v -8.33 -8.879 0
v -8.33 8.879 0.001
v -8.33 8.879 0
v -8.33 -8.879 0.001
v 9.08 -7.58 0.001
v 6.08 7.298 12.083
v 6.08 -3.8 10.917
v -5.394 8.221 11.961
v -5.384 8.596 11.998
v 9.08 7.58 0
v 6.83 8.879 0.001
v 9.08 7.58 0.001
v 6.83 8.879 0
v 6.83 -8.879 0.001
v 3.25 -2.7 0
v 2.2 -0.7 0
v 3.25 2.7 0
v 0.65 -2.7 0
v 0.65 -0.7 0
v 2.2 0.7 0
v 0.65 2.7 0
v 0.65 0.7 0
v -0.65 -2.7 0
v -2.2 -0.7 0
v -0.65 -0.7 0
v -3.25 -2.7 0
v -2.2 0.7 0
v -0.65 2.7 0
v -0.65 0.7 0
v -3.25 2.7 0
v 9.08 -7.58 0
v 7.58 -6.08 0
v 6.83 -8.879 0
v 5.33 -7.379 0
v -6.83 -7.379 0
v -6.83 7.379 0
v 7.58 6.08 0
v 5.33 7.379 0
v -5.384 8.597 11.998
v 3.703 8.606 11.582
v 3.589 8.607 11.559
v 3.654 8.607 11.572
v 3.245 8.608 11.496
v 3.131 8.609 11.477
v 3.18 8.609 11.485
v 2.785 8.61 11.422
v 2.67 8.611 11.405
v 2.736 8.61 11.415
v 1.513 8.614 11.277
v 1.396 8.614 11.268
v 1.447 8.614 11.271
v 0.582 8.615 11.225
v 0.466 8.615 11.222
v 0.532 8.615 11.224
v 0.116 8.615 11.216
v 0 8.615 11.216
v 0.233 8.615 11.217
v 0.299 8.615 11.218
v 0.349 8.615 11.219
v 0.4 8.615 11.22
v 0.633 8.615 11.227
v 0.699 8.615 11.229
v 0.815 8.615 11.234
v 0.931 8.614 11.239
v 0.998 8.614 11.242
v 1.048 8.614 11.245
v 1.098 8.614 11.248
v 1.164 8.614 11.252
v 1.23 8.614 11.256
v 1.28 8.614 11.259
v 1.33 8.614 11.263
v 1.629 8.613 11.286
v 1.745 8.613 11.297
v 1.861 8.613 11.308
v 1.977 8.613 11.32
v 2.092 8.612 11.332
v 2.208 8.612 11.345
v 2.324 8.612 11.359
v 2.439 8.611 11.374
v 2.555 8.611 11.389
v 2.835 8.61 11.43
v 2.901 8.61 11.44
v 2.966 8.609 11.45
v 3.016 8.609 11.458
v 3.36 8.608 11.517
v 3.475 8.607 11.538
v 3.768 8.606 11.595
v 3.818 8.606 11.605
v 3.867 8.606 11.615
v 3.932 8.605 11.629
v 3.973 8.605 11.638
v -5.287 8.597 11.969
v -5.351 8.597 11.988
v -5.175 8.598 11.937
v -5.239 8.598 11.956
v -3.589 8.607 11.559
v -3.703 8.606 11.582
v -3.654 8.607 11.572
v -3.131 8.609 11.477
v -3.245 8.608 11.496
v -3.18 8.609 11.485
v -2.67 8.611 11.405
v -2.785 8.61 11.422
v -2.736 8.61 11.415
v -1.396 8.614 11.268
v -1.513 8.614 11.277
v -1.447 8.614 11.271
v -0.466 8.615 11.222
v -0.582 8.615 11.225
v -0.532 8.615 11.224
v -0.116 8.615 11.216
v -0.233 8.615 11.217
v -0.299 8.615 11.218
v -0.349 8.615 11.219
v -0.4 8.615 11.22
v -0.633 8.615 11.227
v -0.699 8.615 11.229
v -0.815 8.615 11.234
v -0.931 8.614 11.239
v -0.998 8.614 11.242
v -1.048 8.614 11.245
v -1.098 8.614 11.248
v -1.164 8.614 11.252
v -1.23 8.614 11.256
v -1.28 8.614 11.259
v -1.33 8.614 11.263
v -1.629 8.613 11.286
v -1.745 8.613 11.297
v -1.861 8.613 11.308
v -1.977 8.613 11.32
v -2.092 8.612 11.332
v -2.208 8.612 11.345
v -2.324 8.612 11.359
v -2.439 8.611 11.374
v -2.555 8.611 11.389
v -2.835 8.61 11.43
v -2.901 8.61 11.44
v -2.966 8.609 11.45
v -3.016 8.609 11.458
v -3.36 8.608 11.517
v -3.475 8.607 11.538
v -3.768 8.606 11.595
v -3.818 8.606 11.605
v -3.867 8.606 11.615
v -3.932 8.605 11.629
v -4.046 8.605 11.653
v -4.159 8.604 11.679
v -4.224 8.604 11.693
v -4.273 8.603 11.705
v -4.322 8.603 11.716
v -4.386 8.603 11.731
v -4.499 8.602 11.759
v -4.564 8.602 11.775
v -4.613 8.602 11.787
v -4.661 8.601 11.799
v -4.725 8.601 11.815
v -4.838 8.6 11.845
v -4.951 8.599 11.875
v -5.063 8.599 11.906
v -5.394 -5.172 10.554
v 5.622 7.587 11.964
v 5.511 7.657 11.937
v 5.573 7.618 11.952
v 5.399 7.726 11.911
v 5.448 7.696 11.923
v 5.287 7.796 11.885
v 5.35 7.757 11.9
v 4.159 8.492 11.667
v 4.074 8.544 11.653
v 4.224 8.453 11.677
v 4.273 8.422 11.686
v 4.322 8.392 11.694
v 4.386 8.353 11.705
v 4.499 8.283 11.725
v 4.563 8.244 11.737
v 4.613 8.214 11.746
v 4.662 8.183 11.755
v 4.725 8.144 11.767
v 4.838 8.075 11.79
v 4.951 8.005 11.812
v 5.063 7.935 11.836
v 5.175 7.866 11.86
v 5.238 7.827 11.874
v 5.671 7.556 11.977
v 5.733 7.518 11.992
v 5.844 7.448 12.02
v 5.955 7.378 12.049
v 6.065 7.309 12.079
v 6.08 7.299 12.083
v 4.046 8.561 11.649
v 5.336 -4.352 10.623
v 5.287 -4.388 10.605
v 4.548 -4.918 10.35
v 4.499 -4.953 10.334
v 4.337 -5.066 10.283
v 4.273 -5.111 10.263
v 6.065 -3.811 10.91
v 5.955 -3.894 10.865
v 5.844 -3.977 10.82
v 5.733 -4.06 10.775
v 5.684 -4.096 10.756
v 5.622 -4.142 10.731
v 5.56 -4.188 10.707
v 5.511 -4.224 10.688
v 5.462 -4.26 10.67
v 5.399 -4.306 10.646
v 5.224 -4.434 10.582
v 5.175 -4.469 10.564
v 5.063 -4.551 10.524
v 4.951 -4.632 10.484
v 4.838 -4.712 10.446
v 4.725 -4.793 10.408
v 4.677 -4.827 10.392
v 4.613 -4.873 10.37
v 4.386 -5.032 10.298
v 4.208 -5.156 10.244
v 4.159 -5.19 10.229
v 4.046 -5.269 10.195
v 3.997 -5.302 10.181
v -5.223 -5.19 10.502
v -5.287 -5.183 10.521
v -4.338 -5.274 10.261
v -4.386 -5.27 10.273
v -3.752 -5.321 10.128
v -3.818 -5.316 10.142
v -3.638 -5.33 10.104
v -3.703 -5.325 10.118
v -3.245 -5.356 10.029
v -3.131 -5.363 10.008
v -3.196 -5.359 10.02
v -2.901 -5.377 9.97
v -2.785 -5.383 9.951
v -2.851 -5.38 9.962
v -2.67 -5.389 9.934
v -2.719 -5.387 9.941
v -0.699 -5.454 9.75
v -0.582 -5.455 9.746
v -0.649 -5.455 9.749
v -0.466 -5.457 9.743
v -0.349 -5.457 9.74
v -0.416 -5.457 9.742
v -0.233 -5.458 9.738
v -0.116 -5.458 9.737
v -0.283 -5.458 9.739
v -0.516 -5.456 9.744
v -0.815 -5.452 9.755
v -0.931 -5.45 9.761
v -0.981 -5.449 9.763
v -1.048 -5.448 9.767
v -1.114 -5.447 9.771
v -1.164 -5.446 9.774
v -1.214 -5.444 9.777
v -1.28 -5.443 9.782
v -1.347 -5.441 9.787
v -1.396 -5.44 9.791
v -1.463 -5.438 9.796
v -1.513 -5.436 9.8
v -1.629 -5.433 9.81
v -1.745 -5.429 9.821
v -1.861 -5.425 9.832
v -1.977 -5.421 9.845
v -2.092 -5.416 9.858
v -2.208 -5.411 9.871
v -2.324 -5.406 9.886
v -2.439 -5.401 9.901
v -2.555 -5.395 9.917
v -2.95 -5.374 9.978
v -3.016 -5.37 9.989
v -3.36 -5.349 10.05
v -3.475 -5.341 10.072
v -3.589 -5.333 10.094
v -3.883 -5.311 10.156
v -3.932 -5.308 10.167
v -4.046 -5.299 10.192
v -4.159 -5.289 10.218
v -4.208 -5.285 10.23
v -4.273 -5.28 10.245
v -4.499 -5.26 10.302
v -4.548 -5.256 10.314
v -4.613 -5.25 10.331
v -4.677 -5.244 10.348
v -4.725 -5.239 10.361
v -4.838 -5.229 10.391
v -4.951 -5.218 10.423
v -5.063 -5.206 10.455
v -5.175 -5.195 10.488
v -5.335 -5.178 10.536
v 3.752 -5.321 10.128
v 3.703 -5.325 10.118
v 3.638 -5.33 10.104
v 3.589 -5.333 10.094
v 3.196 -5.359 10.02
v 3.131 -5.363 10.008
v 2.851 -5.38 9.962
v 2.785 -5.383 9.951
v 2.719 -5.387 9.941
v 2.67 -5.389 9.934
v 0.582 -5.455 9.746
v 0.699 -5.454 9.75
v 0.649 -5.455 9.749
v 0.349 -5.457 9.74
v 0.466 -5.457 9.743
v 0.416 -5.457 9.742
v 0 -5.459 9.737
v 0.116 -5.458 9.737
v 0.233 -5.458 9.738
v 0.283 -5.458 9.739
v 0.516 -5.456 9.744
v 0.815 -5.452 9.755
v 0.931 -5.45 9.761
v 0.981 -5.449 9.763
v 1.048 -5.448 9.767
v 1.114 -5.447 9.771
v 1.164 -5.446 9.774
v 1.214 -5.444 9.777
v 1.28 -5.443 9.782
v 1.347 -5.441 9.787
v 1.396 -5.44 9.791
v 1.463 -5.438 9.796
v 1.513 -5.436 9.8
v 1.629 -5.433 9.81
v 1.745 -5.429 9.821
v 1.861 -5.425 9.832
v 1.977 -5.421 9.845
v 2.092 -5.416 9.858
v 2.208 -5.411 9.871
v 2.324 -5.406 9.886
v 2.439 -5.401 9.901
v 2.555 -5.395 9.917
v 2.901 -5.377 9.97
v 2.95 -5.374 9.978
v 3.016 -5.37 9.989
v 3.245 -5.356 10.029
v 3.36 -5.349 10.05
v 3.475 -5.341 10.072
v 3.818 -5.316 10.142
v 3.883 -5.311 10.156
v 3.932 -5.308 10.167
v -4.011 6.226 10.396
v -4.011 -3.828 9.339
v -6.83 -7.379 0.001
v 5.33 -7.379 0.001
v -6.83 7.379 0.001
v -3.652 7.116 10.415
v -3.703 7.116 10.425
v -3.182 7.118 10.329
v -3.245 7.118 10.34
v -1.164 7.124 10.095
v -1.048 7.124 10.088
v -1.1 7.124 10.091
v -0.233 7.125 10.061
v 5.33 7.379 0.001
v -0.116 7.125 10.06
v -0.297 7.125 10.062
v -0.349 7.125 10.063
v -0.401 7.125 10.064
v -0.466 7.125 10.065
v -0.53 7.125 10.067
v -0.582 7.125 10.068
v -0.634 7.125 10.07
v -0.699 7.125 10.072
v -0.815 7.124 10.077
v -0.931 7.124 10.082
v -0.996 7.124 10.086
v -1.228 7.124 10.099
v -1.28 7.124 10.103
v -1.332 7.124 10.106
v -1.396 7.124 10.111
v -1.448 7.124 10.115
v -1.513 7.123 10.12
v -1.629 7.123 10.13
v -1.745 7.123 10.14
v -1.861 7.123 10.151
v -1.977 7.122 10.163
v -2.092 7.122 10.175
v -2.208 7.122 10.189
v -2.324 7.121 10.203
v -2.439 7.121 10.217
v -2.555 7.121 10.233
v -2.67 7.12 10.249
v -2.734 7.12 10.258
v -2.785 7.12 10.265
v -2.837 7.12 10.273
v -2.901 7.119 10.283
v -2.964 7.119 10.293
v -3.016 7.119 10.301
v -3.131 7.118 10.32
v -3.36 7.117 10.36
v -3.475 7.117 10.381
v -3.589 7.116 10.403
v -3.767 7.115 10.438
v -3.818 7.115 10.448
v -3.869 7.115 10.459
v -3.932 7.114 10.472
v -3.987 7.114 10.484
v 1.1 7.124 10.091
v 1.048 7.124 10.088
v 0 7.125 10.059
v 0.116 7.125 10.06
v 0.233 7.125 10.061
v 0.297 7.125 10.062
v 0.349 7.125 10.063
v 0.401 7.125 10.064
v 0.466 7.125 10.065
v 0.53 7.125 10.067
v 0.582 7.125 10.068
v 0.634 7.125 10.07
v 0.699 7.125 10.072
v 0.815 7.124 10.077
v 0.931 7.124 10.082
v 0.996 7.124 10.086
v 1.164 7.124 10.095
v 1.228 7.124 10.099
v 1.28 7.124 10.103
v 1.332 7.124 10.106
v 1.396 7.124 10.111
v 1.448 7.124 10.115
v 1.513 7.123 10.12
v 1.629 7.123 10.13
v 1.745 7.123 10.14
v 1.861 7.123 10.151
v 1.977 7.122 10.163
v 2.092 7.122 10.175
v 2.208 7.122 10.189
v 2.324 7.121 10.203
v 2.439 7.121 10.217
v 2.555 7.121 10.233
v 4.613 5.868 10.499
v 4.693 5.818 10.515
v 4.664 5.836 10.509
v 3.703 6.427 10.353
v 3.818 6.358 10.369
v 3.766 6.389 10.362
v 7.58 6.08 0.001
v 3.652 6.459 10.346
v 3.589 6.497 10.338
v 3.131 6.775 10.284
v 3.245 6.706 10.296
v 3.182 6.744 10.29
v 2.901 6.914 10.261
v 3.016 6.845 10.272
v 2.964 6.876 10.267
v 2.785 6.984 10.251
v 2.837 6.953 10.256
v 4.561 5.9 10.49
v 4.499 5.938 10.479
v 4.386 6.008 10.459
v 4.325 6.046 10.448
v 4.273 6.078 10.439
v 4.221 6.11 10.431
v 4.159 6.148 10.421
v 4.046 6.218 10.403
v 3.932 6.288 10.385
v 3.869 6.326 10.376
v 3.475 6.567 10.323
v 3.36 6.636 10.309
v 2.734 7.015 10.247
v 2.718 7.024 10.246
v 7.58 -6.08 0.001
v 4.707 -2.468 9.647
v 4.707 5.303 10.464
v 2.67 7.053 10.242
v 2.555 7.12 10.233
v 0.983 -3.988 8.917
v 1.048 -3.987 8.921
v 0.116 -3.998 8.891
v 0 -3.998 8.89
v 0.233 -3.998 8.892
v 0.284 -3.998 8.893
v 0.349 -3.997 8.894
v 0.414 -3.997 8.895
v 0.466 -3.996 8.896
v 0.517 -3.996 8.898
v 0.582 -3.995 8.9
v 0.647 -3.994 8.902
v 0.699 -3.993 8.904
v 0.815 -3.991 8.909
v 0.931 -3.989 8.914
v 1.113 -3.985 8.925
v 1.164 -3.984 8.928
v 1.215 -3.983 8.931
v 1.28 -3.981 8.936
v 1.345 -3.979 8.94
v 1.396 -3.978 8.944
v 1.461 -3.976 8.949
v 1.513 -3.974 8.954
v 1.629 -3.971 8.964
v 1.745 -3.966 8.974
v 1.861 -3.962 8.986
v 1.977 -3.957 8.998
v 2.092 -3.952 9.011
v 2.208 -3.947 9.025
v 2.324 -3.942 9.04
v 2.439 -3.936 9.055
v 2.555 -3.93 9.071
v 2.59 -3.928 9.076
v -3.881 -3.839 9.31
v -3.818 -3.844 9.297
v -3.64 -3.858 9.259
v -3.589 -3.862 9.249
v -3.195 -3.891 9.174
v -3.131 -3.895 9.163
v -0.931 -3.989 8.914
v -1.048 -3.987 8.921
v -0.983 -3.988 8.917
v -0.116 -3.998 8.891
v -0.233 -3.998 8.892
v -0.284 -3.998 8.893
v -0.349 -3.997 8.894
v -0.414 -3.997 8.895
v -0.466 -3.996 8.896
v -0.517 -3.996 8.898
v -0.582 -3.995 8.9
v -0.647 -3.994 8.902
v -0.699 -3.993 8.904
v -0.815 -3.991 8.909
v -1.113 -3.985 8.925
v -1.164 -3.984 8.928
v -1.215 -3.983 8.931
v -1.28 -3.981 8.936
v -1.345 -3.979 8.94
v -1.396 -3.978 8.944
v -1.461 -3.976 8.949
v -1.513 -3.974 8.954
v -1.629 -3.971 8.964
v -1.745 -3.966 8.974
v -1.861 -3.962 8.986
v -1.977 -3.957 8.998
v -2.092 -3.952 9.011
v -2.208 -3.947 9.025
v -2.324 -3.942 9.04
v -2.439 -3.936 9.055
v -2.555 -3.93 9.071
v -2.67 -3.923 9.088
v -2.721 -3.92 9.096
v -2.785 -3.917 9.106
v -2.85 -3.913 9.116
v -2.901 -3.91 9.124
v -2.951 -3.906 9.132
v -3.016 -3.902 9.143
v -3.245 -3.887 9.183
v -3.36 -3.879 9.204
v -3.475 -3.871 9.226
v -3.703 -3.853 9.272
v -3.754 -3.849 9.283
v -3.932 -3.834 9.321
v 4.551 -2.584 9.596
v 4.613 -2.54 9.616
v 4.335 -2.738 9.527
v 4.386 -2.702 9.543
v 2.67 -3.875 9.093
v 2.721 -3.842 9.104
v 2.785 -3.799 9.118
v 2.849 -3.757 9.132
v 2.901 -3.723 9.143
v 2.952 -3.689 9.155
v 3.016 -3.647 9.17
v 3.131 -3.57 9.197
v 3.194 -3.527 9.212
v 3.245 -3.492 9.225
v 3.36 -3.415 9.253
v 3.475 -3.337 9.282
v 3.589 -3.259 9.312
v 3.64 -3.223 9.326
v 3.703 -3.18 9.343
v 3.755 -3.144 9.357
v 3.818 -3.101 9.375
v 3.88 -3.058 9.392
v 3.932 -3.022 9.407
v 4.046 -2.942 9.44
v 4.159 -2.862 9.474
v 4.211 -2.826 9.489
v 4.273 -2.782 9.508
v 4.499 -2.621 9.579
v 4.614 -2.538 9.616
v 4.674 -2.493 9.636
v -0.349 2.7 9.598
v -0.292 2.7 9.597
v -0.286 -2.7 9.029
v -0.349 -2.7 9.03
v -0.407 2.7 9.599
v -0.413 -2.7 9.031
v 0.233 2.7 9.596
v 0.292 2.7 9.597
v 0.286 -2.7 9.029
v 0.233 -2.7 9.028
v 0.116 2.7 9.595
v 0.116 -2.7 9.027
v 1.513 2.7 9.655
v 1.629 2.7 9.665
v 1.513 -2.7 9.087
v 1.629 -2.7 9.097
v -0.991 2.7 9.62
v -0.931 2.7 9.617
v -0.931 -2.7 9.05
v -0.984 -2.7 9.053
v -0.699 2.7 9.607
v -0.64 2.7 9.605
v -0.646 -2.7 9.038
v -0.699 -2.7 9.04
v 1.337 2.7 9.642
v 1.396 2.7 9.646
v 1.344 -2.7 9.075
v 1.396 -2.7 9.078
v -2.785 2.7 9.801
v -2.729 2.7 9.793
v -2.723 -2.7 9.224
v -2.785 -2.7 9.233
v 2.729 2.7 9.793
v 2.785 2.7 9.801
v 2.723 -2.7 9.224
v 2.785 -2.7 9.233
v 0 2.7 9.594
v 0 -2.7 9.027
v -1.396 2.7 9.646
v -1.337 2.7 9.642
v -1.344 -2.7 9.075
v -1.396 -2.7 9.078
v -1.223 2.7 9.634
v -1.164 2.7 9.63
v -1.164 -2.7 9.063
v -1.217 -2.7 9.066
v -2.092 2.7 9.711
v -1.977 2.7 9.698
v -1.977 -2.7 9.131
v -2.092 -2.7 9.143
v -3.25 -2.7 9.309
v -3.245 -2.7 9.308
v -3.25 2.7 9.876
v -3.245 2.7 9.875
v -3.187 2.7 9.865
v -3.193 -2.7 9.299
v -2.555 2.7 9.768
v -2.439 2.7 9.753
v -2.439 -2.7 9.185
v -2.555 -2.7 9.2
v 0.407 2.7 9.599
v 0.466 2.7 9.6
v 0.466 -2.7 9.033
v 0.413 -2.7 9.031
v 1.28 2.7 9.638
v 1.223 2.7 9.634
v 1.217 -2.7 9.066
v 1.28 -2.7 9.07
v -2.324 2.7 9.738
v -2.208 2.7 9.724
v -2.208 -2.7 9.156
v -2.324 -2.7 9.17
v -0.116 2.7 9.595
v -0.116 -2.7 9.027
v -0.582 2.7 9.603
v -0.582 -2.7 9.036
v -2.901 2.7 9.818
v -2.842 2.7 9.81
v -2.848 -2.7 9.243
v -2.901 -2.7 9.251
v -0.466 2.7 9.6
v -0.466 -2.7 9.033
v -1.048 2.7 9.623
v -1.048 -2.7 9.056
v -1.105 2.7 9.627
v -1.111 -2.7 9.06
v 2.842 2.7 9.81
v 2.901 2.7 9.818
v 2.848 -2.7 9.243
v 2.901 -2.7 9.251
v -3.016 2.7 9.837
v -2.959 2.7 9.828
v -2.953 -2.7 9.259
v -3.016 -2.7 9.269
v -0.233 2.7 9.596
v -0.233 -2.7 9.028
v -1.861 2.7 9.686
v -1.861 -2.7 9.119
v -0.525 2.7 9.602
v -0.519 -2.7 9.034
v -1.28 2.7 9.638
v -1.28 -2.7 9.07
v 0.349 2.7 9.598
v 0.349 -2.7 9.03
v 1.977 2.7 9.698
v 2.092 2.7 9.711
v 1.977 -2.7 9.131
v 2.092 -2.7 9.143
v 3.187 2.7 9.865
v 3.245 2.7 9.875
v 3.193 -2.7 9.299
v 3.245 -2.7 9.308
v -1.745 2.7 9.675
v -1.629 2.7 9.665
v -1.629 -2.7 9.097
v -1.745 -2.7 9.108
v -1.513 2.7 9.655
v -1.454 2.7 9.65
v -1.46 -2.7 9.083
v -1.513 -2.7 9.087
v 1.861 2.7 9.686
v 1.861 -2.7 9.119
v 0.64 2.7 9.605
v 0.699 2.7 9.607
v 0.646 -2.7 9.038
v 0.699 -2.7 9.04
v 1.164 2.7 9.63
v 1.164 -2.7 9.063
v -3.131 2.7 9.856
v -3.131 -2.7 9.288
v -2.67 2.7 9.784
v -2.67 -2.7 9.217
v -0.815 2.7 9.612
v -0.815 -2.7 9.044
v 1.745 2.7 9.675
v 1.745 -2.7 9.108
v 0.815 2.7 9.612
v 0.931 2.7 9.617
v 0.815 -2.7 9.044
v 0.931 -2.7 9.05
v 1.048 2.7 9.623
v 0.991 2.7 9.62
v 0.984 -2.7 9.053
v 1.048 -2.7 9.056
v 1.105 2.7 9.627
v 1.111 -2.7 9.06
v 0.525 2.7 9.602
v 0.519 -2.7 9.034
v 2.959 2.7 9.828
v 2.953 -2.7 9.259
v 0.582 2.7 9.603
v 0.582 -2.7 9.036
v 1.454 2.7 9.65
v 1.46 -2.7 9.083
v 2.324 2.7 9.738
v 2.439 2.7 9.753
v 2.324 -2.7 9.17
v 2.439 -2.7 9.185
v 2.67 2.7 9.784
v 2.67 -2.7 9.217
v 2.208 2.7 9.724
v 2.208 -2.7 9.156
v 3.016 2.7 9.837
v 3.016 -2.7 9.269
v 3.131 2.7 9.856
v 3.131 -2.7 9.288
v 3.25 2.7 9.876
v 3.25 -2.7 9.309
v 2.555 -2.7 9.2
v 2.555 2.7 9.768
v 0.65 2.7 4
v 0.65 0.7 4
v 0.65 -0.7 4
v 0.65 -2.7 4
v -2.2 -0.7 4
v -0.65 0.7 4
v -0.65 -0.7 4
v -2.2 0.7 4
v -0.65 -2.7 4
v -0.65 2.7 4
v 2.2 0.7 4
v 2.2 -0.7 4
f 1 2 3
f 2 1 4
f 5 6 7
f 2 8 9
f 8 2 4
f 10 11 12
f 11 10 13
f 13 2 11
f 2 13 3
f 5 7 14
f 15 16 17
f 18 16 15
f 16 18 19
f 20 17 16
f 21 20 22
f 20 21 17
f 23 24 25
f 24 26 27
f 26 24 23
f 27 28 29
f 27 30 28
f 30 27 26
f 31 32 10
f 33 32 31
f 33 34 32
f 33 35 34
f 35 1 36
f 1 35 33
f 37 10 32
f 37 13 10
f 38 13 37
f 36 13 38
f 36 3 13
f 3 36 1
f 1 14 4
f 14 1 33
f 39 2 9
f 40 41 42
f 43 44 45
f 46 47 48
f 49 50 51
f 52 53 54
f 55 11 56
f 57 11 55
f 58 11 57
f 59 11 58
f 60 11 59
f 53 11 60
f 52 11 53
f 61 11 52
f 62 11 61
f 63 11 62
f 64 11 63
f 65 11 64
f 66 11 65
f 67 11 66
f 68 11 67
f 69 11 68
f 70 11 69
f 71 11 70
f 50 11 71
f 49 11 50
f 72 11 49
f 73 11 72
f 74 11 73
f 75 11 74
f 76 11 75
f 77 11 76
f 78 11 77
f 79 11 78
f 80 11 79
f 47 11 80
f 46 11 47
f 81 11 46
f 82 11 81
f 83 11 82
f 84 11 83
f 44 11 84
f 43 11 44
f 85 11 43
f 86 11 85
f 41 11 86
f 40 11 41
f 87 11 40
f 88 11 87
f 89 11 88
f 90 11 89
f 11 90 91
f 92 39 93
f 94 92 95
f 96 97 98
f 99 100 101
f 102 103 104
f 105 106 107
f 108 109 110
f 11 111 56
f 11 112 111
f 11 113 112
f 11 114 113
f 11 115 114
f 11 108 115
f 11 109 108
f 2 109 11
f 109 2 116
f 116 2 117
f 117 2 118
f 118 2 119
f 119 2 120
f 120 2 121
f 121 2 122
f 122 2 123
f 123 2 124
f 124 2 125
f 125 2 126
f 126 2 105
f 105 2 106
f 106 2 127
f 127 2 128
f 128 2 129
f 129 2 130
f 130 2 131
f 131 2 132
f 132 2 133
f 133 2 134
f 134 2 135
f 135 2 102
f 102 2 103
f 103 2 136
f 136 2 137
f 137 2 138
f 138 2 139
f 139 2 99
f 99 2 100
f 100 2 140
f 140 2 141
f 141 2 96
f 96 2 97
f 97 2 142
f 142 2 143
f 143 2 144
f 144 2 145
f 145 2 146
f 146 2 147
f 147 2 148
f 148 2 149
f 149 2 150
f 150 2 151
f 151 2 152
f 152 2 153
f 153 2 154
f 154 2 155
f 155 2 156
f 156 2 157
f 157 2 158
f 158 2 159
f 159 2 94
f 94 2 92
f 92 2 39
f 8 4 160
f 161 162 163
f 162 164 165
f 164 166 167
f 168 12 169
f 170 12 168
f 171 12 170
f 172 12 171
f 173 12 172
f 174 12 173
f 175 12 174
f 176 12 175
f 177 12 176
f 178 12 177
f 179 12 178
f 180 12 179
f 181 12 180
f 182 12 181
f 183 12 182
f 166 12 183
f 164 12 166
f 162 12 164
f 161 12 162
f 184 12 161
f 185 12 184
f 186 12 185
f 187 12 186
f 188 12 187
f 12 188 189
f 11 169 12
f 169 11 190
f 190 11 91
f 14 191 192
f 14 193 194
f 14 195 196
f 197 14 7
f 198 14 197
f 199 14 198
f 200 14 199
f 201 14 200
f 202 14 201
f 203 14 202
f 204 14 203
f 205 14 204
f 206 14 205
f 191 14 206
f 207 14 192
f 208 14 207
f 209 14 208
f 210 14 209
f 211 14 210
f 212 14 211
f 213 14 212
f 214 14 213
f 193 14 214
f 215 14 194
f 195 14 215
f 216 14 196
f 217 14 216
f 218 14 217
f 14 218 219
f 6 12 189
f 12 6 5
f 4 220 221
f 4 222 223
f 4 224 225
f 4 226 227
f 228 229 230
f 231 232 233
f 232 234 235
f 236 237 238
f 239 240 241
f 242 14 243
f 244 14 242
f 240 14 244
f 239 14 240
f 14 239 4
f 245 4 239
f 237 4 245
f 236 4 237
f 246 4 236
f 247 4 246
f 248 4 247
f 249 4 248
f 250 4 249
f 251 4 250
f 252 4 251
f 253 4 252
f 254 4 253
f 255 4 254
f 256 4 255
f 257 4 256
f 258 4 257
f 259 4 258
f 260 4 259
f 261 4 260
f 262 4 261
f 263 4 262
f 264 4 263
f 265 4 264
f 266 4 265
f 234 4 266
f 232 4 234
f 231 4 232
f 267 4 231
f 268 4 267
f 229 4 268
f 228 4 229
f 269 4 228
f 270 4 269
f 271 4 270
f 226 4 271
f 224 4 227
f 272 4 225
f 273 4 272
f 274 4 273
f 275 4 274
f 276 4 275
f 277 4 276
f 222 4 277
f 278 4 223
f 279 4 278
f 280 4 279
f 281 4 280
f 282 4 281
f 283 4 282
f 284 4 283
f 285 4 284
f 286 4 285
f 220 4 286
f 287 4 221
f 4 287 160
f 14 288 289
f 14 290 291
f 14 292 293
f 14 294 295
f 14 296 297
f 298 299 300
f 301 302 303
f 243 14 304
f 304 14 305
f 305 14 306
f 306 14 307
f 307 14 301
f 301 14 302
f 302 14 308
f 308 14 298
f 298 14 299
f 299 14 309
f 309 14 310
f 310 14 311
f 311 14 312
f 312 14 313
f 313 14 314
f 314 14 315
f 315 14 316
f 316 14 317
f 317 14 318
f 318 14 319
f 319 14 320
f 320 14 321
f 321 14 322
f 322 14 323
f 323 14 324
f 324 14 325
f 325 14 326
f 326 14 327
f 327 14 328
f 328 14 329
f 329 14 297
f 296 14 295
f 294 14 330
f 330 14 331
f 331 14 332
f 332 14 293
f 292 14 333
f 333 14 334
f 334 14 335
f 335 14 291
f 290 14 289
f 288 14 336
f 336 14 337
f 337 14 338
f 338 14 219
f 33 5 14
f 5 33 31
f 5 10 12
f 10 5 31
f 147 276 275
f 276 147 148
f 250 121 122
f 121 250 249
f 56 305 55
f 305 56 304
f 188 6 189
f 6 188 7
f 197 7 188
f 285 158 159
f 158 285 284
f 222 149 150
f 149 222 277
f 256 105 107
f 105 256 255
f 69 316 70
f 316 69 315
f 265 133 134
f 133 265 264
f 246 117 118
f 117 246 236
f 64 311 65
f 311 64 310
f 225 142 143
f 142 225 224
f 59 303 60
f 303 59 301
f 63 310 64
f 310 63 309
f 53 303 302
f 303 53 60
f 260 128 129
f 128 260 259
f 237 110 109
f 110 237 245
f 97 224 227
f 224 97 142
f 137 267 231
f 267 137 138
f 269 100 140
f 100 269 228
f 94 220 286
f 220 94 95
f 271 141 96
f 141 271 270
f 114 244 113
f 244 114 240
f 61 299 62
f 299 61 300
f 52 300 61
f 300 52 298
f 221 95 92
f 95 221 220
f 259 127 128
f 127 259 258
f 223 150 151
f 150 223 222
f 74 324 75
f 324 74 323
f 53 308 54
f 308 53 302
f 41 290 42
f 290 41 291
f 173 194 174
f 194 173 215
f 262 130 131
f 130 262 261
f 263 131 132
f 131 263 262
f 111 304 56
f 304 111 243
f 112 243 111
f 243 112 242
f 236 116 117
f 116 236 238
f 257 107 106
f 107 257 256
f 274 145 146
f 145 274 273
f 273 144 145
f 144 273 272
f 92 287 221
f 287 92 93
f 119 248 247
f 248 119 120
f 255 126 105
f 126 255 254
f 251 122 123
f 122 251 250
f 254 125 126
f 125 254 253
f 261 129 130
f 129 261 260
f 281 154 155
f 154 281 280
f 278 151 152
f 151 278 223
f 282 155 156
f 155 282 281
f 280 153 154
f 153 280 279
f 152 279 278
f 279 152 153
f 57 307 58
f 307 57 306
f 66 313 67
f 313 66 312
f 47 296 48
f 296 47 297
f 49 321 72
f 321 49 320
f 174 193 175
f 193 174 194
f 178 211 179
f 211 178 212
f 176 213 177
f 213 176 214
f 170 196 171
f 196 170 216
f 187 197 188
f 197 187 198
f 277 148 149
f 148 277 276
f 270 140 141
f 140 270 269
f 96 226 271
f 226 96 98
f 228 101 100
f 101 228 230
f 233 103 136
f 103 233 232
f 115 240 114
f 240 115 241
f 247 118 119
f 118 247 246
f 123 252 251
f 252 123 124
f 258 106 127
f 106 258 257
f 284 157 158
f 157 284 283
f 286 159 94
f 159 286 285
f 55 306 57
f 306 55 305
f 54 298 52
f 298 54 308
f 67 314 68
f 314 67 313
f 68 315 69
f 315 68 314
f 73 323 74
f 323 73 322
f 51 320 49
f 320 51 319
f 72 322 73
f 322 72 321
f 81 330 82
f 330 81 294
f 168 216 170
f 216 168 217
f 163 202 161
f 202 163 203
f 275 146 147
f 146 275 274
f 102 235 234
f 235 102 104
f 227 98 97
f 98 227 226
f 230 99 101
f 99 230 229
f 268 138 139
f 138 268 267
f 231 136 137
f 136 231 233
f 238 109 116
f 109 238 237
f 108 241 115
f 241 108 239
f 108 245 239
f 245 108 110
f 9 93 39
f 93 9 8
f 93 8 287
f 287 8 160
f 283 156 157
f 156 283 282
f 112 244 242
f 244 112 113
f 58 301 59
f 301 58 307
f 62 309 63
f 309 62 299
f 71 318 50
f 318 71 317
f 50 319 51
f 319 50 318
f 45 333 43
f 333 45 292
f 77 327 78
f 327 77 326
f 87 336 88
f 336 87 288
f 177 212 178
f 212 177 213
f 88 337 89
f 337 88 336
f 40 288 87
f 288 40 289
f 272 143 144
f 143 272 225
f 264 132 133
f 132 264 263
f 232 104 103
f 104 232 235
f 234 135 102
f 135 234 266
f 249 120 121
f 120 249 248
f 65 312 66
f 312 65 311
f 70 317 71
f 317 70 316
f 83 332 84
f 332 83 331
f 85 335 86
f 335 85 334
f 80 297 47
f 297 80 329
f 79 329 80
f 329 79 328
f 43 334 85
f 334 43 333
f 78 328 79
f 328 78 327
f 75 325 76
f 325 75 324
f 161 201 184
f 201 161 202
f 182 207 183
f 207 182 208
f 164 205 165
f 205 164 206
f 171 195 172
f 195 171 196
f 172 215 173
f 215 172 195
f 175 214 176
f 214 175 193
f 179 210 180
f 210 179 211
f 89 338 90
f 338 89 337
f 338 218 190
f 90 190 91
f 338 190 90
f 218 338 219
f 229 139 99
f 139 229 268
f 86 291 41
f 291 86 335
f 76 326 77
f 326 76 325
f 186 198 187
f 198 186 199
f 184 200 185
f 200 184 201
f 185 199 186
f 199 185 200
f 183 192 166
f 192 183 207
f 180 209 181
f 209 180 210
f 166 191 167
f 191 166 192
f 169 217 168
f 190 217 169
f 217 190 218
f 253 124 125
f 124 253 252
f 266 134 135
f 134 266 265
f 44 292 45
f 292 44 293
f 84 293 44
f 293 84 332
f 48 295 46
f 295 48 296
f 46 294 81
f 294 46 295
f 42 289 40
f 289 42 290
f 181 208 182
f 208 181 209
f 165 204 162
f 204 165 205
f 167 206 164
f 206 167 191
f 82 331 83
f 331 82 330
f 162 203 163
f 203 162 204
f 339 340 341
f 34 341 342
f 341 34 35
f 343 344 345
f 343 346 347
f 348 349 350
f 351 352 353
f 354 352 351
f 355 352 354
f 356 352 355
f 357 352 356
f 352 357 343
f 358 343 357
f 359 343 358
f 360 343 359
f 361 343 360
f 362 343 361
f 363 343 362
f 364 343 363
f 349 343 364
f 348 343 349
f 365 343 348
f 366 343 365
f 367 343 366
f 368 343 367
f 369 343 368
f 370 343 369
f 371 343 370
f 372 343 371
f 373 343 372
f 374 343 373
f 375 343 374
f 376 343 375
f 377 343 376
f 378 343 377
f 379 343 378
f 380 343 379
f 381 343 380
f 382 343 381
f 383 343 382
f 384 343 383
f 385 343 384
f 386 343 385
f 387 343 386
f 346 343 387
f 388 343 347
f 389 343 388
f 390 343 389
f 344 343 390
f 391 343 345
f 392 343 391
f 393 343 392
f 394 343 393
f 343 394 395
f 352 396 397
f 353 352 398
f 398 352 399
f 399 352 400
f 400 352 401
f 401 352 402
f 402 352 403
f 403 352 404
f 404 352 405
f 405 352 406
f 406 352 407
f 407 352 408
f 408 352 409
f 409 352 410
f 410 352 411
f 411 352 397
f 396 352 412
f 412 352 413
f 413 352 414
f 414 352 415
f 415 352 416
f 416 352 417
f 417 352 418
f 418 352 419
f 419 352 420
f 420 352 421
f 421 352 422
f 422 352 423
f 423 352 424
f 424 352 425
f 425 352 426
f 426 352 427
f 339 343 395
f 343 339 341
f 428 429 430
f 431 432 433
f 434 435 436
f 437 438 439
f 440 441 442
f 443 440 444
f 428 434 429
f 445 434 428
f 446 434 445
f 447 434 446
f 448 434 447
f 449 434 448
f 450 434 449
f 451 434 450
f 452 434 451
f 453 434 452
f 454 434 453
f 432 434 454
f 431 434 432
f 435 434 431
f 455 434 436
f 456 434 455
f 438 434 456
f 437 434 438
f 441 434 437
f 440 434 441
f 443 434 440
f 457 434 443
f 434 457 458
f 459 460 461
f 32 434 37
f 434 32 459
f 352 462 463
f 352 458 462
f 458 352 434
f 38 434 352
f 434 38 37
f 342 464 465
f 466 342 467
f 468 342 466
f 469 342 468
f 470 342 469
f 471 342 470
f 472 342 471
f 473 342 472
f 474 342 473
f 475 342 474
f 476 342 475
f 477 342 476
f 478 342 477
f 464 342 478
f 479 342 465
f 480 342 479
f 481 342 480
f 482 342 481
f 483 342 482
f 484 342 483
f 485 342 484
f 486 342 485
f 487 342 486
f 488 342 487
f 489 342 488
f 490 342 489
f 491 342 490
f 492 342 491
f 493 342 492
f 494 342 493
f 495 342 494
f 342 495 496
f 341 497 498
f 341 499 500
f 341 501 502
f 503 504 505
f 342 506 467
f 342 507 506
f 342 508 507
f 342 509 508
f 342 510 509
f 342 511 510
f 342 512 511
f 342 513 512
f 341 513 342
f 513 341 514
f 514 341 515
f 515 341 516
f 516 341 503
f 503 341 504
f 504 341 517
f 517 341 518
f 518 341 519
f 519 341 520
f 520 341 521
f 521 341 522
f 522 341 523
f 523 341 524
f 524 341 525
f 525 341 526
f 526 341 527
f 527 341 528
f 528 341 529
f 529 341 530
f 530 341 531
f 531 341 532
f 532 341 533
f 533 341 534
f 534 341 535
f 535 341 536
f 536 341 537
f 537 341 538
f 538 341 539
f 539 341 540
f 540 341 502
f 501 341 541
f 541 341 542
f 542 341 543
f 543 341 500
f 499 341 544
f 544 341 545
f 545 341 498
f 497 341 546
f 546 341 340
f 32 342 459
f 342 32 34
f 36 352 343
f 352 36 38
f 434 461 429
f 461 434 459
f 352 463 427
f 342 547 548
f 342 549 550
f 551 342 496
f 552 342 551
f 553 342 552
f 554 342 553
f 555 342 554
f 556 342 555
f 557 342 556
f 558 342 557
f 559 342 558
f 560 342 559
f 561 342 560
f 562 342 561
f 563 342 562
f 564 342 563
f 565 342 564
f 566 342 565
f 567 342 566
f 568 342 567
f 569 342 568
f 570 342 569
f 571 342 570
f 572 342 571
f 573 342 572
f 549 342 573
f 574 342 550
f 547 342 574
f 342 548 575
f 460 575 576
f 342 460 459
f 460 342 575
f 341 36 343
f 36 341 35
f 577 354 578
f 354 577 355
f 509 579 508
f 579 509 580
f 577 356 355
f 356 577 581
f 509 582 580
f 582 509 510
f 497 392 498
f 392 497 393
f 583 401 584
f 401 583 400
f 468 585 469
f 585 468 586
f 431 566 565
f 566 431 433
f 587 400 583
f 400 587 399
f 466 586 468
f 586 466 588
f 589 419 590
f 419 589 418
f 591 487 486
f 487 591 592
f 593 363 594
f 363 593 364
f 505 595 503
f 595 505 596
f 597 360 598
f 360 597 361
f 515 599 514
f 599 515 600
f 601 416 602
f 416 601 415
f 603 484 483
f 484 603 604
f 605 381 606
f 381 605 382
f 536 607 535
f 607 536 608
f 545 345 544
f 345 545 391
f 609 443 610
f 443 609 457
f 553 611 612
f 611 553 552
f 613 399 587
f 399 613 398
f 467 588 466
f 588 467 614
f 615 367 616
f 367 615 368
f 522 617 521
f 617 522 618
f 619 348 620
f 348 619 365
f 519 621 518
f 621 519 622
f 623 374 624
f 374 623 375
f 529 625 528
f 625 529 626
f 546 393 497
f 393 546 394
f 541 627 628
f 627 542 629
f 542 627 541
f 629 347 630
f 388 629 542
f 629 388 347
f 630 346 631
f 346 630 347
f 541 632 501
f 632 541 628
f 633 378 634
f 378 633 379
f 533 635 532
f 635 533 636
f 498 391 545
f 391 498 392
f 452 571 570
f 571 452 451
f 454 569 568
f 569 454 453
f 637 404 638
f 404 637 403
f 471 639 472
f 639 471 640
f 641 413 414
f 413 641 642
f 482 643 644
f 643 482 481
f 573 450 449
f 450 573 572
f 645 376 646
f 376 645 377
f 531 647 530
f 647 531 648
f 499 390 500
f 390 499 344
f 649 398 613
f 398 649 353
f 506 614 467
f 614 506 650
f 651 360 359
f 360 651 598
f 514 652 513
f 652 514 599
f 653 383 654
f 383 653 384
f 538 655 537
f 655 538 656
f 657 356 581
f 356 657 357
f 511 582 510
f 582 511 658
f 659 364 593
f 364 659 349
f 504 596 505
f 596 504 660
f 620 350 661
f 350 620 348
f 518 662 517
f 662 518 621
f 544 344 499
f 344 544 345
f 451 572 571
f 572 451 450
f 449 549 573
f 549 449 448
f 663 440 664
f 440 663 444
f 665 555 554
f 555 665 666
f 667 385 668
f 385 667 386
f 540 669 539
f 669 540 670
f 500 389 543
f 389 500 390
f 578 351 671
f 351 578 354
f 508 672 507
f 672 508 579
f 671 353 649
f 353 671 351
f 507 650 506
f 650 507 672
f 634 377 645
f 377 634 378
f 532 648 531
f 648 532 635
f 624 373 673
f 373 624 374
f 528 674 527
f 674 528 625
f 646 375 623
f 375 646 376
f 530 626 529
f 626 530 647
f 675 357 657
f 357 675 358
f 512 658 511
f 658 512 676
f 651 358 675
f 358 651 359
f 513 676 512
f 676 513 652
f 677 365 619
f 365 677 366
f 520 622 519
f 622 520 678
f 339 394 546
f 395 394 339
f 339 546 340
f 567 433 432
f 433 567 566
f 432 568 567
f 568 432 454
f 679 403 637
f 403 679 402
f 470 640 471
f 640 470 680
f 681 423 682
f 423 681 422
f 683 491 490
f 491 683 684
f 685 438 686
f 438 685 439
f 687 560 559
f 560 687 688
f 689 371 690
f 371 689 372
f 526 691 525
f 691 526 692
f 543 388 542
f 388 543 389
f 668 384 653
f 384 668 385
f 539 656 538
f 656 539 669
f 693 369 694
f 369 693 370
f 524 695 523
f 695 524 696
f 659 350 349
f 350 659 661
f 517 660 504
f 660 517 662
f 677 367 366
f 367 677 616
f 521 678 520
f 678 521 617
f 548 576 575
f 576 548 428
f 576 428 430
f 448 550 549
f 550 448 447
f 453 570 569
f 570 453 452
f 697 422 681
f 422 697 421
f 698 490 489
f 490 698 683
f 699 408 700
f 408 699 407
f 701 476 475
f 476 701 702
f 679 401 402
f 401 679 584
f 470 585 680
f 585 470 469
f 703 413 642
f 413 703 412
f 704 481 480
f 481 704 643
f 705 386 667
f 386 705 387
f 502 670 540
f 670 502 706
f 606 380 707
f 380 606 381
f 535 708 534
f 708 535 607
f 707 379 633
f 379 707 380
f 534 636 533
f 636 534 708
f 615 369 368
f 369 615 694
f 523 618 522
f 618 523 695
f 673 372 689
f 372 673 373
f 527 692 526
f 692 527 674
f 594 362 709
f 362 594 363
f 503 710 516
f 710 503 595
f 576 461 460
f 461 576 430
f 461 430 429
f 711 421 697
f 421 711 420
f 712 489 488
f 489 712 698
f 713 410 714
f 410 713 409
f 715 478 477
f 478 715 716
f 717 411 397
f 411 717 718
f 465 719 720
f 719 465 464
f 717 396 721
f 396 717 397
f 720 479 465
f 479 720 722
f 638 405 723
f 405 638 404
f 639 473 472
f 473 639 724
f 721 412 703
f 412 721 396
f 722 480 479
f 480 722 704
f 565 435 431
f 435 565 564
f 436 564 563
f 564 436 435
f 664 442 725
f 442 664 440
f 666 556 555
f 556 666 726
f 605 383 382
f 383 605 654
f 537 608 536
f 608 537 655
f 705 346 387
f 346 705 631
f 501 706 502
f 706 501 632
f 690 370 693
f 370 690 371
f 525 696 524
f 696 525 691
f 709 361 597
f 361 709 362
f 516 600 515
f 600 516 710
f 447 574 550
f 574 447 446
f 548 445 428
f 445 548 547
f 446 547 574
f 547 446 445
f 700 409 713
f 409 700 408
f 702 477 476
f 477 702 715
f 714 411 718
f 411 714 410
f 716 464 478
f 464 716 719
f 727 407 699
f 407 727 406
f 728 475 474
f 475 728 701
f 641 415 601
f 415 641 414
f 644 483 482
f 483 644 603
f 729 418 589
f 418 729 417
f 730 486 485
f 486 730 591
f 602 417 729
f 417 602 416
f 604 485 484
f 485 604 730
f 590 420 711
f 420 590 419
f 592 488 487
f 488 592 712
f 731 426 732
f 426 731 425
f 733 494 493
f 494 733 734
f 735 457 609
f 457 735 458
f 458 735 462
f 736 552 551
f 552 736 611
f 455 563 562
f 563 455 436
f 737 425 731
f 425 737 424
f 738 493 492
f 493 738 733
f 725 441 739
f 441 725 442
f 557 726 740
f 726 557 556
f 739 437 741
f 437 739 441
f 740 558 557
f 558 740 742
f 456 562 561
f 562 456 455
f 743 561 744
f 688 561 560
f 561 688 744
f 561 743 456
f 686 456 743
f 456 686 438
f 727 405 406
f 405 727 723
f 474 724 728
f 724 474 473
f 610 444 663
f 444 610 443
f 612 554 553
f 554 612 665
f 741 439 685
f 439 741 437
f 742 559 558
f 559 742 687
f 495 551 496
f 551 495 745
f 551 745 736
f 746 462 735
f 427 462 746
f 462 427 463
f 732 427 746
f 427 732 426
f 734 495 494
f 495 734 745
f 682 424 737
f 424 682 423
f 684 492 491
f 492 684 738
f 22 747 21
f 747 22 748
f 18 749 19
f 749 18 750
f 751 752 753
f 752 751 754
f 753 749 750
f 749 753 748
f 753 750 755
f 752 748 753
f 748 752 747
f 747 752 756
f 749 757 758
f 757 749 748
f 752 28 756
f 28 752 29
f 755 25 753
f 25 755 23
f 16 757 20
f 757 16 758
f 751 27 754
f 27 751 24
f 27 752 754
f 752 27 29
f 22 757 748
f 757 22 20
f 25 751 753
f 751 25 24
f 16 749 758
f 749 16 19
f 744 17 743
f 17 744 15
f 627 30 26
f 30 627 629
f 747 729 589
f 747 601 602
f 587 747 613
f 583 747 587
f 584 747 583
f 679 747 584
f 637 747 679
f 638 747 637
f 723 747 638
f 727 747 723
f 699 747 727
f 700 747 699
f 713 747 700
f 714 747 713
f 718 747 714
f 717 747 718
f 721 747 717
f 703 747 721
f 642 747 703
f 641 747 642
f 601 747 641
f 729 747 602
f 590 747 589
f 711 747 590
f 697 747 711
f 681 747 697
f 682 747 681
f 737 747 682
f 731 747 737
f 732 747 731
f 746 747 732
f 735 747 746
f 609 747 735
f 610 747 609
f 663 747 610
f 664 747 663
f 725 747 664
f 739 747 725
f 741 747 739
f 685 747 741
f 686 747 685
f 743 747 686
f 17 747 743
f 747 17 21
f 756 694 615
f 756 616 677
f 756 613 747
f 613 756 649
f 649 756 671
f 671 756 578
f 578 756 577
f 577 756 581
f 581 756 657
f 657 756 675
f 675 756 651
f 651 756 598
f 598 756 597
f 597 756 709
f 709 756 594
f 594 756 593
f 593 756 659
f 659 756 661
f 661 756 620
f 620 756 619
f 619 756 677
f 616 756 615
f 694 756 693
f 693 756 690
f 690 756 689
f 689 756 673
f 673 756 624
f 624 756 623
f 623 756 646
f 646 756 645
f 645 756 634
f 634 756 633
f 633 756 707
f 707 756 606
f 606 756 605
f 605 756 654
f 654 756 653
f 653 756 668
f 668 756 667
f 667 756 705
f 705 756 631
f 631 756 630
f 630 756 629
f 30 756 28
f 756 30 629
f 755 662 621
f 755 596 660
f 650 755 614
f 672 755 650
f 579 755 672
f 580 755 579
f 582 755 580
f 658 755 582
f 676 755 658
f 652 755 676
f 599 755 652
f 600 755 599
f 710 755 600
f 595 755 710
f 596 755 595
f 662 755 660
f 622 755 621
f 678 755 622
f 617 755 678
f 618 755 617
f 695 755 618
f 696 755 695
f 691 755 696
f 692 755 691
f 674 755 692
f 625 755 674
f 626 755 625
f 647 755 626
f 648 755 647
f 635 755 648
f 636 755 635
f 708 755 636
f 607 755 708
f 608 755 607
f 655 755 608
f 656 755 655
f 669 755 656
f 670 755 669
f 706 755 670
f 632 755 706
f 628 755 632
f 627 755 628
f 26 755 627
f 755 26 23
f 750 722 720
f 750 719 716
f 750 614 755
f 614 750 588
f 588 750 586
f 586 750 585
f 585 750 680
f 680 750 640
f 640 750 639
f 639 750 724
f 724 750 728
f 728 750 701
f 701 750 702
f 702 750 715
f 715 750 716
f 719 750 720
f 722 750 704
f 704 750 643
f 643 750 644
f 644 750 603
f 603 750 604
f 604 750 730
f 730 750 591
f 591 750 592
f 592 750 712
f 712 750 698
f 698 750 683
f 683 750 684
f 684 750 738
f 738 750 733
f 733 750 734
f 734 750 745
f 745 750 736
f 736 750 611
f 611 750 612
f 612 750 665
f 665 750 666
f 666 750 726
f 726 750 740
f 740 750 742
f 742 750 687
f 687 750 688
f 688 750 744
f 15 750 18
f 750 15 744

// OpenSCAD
/* [Key] */

//length in units of key
key_length = 1;
//height in units of key. should remain 1 for most uses
key_height = 1;
//keycap type, [0:DCS Row 5, 1:DCS Row 1, 2:DCS Row 2, 3:DCS Row 3, 4:DCS Row 4, 5:DSA Row 3, 6:SA Row 1, 7:SA Row 2, 8:SA Row 3, 9:SA Row 4, 10:DCS Row 4 Spacebar, 11: g20 key (faked)]
key_profile_index = 0;

// keytop thickness, aka how many millimeters between the inside and outside of the top surface of the key
keytop_thickness = 1;

// wall thickness, aka the thickness of the sides of the keycap. note this is the total thickness, aka 3 = 1.5mm walls
wall_thickness = 3;

/* [Brim] */
//enable brim for connector
has_brim = 0;
//brim radius. 11 ensconces normal keycap stem in normal keycap
brim_radius = 11;
//brim depth
brim_depth = .3;

/* [Stabilizers] */
//whether stabilizer connectors are enabled
stabilizers = 0;
//stabilizer distance in mm
stabilizer_distance = 50;

/* [Dish] */
// invert dishing. mostly for spacebar
inverted_dish = 0;

/* [Stem] */
// cherry MX or Alps stem, or totally broken circular cherry stem [0..2]
stem_profile = 0;
// how inset the stem is from the bottom of the key. experimental. requires support
stem_inset = 0;
// stem offset in units NOT MM. for stepped caps lock
stem_offset = 0;

/* [Hidden] */
//change to round things better
//$fn = 32;
$fn = 3;
//beginning to use unit instead of baked in 19.05
unit = 19.05;

//minkowski radius. radius of sphere used in minkowski sum for minkowski_key function. 1.75 default for faux G20
minkowski_radius = 1.75;

//profile specific stuff

/*
 Here we have, for lack of a better implementation, an array
 that defines the more intimate aspects of a key.
 order is thus:
 1. Bottom Key Width: width of the immediate bottom of the key
 2. Bottom Key Height: height of the immediate bottom of the key
 3. Top Key Width Difference: mm to subtract from bottom key width to create top key width
 4. Top Key Height Difference: mm to subtract from bottom key height to create top key height
 5. total Depth: how tall the total in the switch is before dishing
 6. Top Tilt: X rotation of the top. Top and dish obj are rotated
 7. Top Skew: Y skew of the top of the key relative to the bottom. DCS has some, DSA has none (its centered)
 8. Dish Type: type of dishing. check out dish function for the options
 9. Dish Depth: how many mm to cut into the key with
 10. Dish Radius: radius of dish obj, the Sphere or Cylinder that cuts into the keycap
*/

key_profiles = [

	//DCS Profile

	[ //DCS ROW 5
		18.16,  // Bottom Key Width
		18.16,  // Bottom Key Height
		6,   // Top Key Width Difference
		4,   // Top Key Height Difference
		11.5, // total Depth
		-6,  // Top Tilt
		1.75,// Top Skew

		//Dish Profile

		0,   // Dish Type
		1,   // Dish Depth
		0,   // Dish Skew X
		0    // DIsh Skew Y
	],
	[ //DCS ROW 1
		18.16,  // Bottom Key Width
		18.16,  // Bottom Key Height
		6,   // Top Key Width Difference
		4,   // Top Key Height Difference
		8.5, // total Depth
		-1,  // Top Tilt
		1.75,// Top Skew

		//Dish Profile

		0,   // Dish Type
		1,   // Dish Depth
		0,   // Dish Skew X
		0    // DIsh Skew Y
	],
	[ //DCS ROW 2
		18.16,  // Bottom Key Width
		18.16,  // Bottom Key Height
		6.2,   // Top Key Width Difference
		4,   // Top Key Height Difference
		7.5, // total Depth
		3,  // Top Tilt
		1.75,// Top Skew

		//Dish Profile

		0,   // Dish Type
		1,   // Dish Depth
		0,   // Dish Skew X
		0    // DIsh Skew Y
	],
	[ //DCS ROW 3
		18.16,  // Bottom Key Width
		18.16,  // Bottom Key Height
		6,   // Top Key Width Difference
		4,   // Top Key Height Difference
		6.2, // total Depth
		7,  // Top Tilt
		1.75,// Top Skew

		//Dish Profile

		0,   // Dish Type
		1,   // Dish Depth
		0,   // Dish Skew X
		0    // DIsh Skew Y
	],
	[ //DCS ROW 4
		18.16,  // Bottom Key Width
		18.16,  // Bottom Key Height
		6,   // Top Key Width Difference
		4,   // Top Key Height Difference
		6.2, // total Depth
		16,  // Top Tilt
		1.75,// Top Skew

		//Dish Profile

		0,   // Dish Type
		1,   // Dish Depth
		0,   // Dish Skew X
		0    // DIsh Skew Y
	],

	//DSA Profile

	[ //DSA ROW 3
	  18.4,  // Bottom Key Width
	  18.4,  // Bottom Key Height
	  5.7, // Top Key Width Difference
	  5.7, // Top Key Height Difference
	  7.4, // total Depth
	  0,   // Top Tilt
	  0,   // Top Skew

	  //Dish Profile

	  1,   // Dish Type
	  1.2, // Dish Depth
	  0,   // Dish Skew X
	  0    // DIsh Skew Y
	],

	//SA Proile

	[ //SA ROW 1
		18.4,  // Bottom Key Width
	  18.4,  // Bottom Key Height
	  5.7, // Top Key Width Difference
	  5.7, // Top Key Height Difference
	  13.73, // total Depth, fudged
	  -14,   // Top Tilt
	  0,   // Top Skew

	  //Dish Profile

	  1,   // Dish Type
	  1.2, // Dish Depth
	  0,   // Dish Skew X
	  0    // DIsh Skew Y
	],
	[ //SA ROW 2
		18.4,  // Bottom Key Width
	  18.4,  // Bottom Key Height
	  5.7, // Top Key Width Difference
	  5.7, // Top Key Height Difference
	  11.73, // total Depth
	  -7,   // Top Tilt
	  0,   // Top Skew

	  //Dish Profile

	  1,   // Dish Type
	  1.2, // Dish Depth
	  0,   // Dish Skew X
	  0    // DIsh Skew Y
	],
	[ //SA ROW 3
		18.4,  // Bottom Key Width
	  18.4,  // Bottom Key Height
	  5.7, // Top Key Width Difference
	  5.7, // Top Key Height Difference
	  11.73, // total Depth
	  0,   // Top Tilt
	  0,   // Top Skew

	  //Dish Profile

	  1,   // Dish Type
	  1.2, // Dish Depth
	  0,   // Dish Skew X
	  0    // DIsh Skew Y
	],
	[ //SA ROW 4
		18.4,  // Bottom Key Width
	  18.4,  // Bottom Key Height
	  5.7, // Top Key Width Difference
	  5.7, // Top Key Height Difference
	  11.73, // total Depth
	  7,   // Top Tilt
	  0,   // Top Skew

	  //Dish Profile

	  1,   // Dish Type
	  1.2, // Dish Depth
	  0,   // Dish Skew X
	  0    // DIsh Skew Y
	],
	[ //DCS ROW 4 SPACEBAR
		18.16,  // Bottom Key Width
		18.16,  // Bottom Key Height
		6,   // Top Key Width Difference
		4,   // Top Key Height Difference
		6.2, // total Depth
		16,  // Top Tilt
		1.75,// Top Skew

		//Dish Profile

		2,   // Dish Type
		1,   // Dish Depth
		0,   // Dish Skew X
		0    // DIsh Skew Y
	],
	[ //G20 AKA DCS Row 2 with no dish and shorter
		18.16,  // Bottom Key Width
		18.16,  // Bottom Key Height
		2,   // Top Key Width Difference
		2,   // Top Key Height Difference
		6, // total Depth
		2.5,  // Top Tilt
		0.75,// Top Skew

		//Dish Profile

		3,   // Dish Type
		0,   // Dish Depth
		0,   // Dish Skew X
		0    // DIsh Skew Y
	],
	[ //NONWORKING fake ISO enter
		18.16 * 1.5,  // Bottom Key Width
		18.16 * 2,  // Bottom Key Height
		4,   // Top Key Width Difference
		4,   // Top Key Height Difference
		7, // total Depth
		0,  // Top Tilt
		1.75,// Top Skew

		//Dish Profile

		0,   // Dish Type
		1,   // Dish Depth
		0,   // Dish Skew X
		0    // DIsh Skew Y
	],
];

// derived variables
//key profile selected
key_profile = key_profiles[key_profile_index];

// names, so I don't go crazy
bottom_key_width = key_profile[0];
bottom_key_height = key_profile[1];
width_difference = key_profile[2];
height_difference = key_profile[3];
total_depth = key_profile[4];
top_tilt = key_profile[5] / key_height;
top_skew = key_profile[6];
dish_type = key_profile[7];
dish_depth = key_profile[8];
dish_skew_x = key_profile[9];
dish_skew_y = key_profile[10];

// actual mm key width and height
total_key_width = bottom_key_width + (unit * (key_length - 1));
total_key_height = bottom_key_height + (unit * (key_height - 1));

// actual mm key width and height at the top
top_total_key_width = bottom_key_width + (unit * (key_length - 1)) - width_difference;
top_total_key_height = bottom_key_height + (unit * (key_height - 1)) - height_difference;

//centered
module roundedRect(size, radius) {
	x = size[0];
	y = size[1];
	z = size[2];

	translate([-x/2,-y/2,0])
	linear_extrude(height=z)
	hull() {
		translate([radius, radius, 0])
		circle(r=radius);

		translate([x - radius, radius, 0])
		circle(r=radius);

		translate([x - radius, y - radius, 0])
		circle(r=radius);

		translate([radius, y - radius, 0])
		circle(r=radius);
	}
}

// stem related stuff

// bottom we can use to anchor the stem, just a big ol cube with the inside of
// the keycap hollowed out
module inside(){
	difference(){
		translate([0,0,50]) cube([100000,100000,100000],center=true);
		// NOTE: you're saying hey, if this is the inside why aren't we doing
		// wall_thickness, keytop_thickness? well first off congratulations for
		// figuring that out cuz it's a rat's nest in here. second off
		// due to how the minkowski_key function works that isn't working out right
		// now. it's a simple change if is_minkowski is implemented though
		shape(0, 0);
	}
}

module cherry_stem(){
	// cross length
	cross_length = 4.4;
  //extra vertical cross length - the extra length of the up/down bar of the cross
  extra_vertical_cross_length = 1.1;
	//dimensions of connector
	// outer cross extra length in x
	extra_outer_cross_width = 2.10;
	// outer cross extra length in y
	extra_outer_cross_height = 1.0;
	// dimensions of cross
	// horizontal cross bar width
	horizontal_cross_width = 1.4;
	// vertical cross bar width
	vertical_cross_width = 1.3;
	// cross depth, stem height is 3.4mm
	cross_depth = 4;

	difference(){
		union(){
            if (stem_profile != 2){
                translate([
                    -(cross_length+extra_outer_cross_width)/2,
                    -(cross_length+extra_outer_cross_height)/2,
                    stem_inset
                ])
    			cube([ // the base of the stem, the part the cruciform digs into
					cross_length+extra_outer_cross_width,
					cross_length+extra_outer_cross_height,
					50
    			]);
            } else {
                cylinder(
                    d = cross_length+extra_outer_cross_height,
                    h = 50
                );
            }
			if (has_brim == 1){ cylinder(r=brim_radius,h=brim_depth); }
		}
		//the cross part of the steam
		translate([0,0,(cross_depth)/2 + stem_inset]){
	        cube([vertical_cross_width,cross_length+extra_vertical_cross_length,cross_depth], center=true );
	        cube([cross_length,horizontal_cross_width,cross_depth], center=true );
	    }
	}
}

module alps_stem(){
	cross_depth = 40;
	width = 4.45;
	height = 2.25;

	base_width = 12;
	base_height = 15;

	translate([0,0,cross_depth/2 + stem_inset]){
		cube([width,height,cross_depth], center = true);
	}
}

//whole connector, alps or cherry, trimmed to fit
module connector(has_brim){
	difference(){
		//TODO can I really not do an array index here?
		translate([-unit * stem_offset, 0, 0])
		union(){
			if(stem_profile == 0 || stem_profile == 2) cherry_stem();
			if(stem_profile == 1) alps_stem();
		}
		inside();
	}
}

//stabilizer connectors
module stabilizer_connectors(has_brim){
	translate([stabilizer_distance,0,0]) connector(has_brim);
	translate([-stabilizer_distance,0,0]) connector(has_brim);
}



//shape related stuff




//general shape of key. used for inside and outside
module shape(thickness_difference, depth_difference){
  if (inverted_dish == 1){
		difference(){
			union(){
				shape_hull(thickness_difference, depth_difference, 1);
				dish(depth_difference);
			}
			outside(thickness_difference);
		}
	} else{
		difference(){
			shape_hull(thickness_difference, depth_difference, 1);
			dish(depth_difference);
		}
	}
}

// conicalish clipping shape to trim things off the outside of the keycap
// literally just a key with height of 2 to make sure nothing goes awry with dishing etc
module outside(thickness_difference){
	difference(){
		cube([100000,100000,100000],center = true);
		shape_hull(thickness_difference, 0, 2);
	}
}

// super basic hull shape without dish
// modifier multiplies the height and top differences of the shape,
// which is only used for dishing to cut the dish off correctly
// height_difference used for keytop thickness
module shape_hull(thickness_difference, depth_difference, modifier){
	hull(){
		// bottom_key_width + (key_length -1) * unit is the correct length of the
		// key. only 1u of the key should be bottom_key_width long; all others
		// should be 1u
		roundedRect([total_key_width - thickness_difference, total_key_height - thickness_difference, .001],1.5);

		//height_difference outside of modifier because that doesnt make sense
		translate([0,top_skew,total_depth * modifier - depth_difference])
		rotate([-top_tilt,0,0])
		roundedRect([total_key_width - thickness_difference - width_difference * modifier, total_key_height - thickness_difference - height_difference * modifier, .001],1.5);
	}
}



//dish related stuff



//dish selector
module dish(depth_difference){
	if(dish_type == 0){ // cylindrical dish
		cylindrical_dish(depth_difference);
	}
	else if (dish_type == 1) { // spherical dish
		spherical_dish(depth_difference);
	}
	else if (dish_type == 2){ // SIDEWAYS cylindrical dish - used for spacebar
		sideways_cylindrical_dish(depth_difference);
	}
  else if (dish_type == 3){
  	// no dish
  }
}

module cylindrical_dish(depth_difference){
	/* we do some funky math here
	 * basically you want to have the dish "dig in" to the keycap x millimeters
	 * in order to do that you have to solve a small (2d) system of equations
	 * where the chord of the spherical cross section of the dish is
	 * the width of the keycap.
	 */
	// the distance you have to move the dish up so it digs in dish_depth millimeters
	chord_length = (pow(top_total_key_width, 2) - 4 * pow(dish_depth, 2)) / (8 * dish_depth);
	//the radius of the dish
	rad = (pow(top_total_key_width, 2) + 4 * pow(dish_depth, 2)) / (8 * dish_depth);

	if (inverted_dish == 1){
		translate([dish_skew_x, top_skew + dish_skew_y, total_depth - depth_difference])
		rotate([90-top_tilt,0,0])
		translate([0,-chord_length,0])
		cylinder(h=100,r=rad, $fn=1024, center=true);
	}
	else{
		translate([dish_skew_x, top_skew + dish_skew_y, total_depth - depth_difference])
		rotate([90-top_tilt,0,0])
		translate([0,chord_length,0])
		cylinder(h=100,r=rad, $fn=1024, center=true);
	}

}

module spherical_dish(depth_difference){
	//same thing as the cylindrical dish here, but we need the corners to just touch - so we have to find the hypotenuse of the top
	chord = pow((pow(top_total_key_width,2) + pow(top_total_key_height, 2)),0.5); //getting diagonal of the top

	// the distance you have to move the dish up so it digs in dish_depth millimeters
	chord_length = (pow(chord, 2) - 4 * pow(dish_depth, 2)) / (8 * dish_depth);
	//the radius of the dish
	rad = (pow(chord, 2) + 4 * pow(dish_depth, 2)) / (8 * dish_depth);

	if (inverted_dish == 1){
		translate([dish_skew_x, top_skew + dish_skew_y, total_depth - depth_difference])
		rotate([-top_tilt,0,0])
		translate([0,0,-chord_length])
		//NOTE: if your dish is long at all you might need to increase this number
		sphere(r=rad, $fn=512);
	}
	else{
		translate([dish_skew_x, top_skew + dish_skew_y, total_depth - depth_difference])
		rotate([-top_tilt,0,0])
		translate([0,0,chord_length])
		sphere(r=rad, $fn=256);
	}
}

module sideways_cylindrical_dish(depth_difference){
	chord_length = (pow(top_total_key_height, 2) - 4 * pow(dish_depth, 2)) / (8 * dish_depth);
	rad = (pow(top_total_key_height, 2) + 4 * pow(dish_depth, 2)) / (8 * dish_depth);

	if (inverted_dish == 1){
		translate([dish_skew_x, top_skew + dish_skew_y, total_depth - depth_difference])
		rotate([90,top_tilt,90])
		translate([0,-chord_length,0])
		cylinder(h=total_key_width + 20,r=rad, $fn=1024, center=true); // +20 just cuz
	}
	else{
		translate([dish_skew_x, top_skew + dish_skew_y, total_depth - depth_difference])
		rotate([90,top_tilt,90])
		translate([0,chord_length,0])
		cylinder(h=total_key_width + 20,r=rad, $fn=1024, center=true);
	}
}



//actual full key with space carved out and keystem/stabilizer connectors
module key(){
	union(){
		difference(){
			shape(0, 0);
			shape(wall_thickness, keytop_thickness);
		}
	}

	connector(has_brim);

	if (stabilizers == 1){
		stabilizer_connectors(has_brim);
	}
}

// ACTUAL OUTPUT
difference(){
	key();
	// preview cube, for seeing inside the keycap
	//cube([100,100,100]);
}

//minkowski_key();




// Experimental stuff


// key rounded with minkowski sum. still supports wall and keytop thickness.
// use in actual output section. takes a long time to render with dishes.
// required for keycap 11, G20 keycap.
module minkowski_key(){
	union(){
		difference(){
			minkowski(){
				shape(minkowski_radius*2, minkowski_radius);
				difference(){
					sphere(r=minkowski_radius, $fn=24);
					translate([0,0,-minkowski_radius])
						cube([2*minkowski_radius,2*minkowski_radius,2*minkowski_radius], center=true);
				}
			}
			shape(wall_thickness, keytop_thickness);
		}
	}

	connector(has_brim);

	if (stabilizers == 1){
		stabilizer_connectors(has_brim);
	}
}


// NOT 3D, NOT CENTERED
// corollary is roundedRect
module fakeISOEnter(thickness_difference){
    z = 0.001;
    radius = 2;
		/*TODO I figured it out. 18.16 is the actual keycap width / height,
		whereas 19.01 is the unit. ISO enter obeys that just like everything else,
		which means that it's height is 18.16 * 2 + (19.01 - 18.16) or, two
		keycap heights plus the space between them, also known as 18.16 +
		(19.01 * (key_height - 1)). this is followed by the width too. should fix
		to make this finally work*/
    unit = 18.16; // TODO probably not

		// t is all modifications to the polygon array
		t = radius + thickness_difference/2;

    pointArray = [
        [0 + t,0 + t],
        [unit*1.25 - t, 0 + t],
        [unit*1.25  - t, unit*2  - t],
        [unit*-.25 + t, unit*2  - t],
        [unit*-.25 + t, unit*1  + t],
        [0 + t, unit*1  + t]
    ];

    minkowski(){
        circle(r=radius, $fn=24);
        polygon(points=pointArray);
    }
}

//corollary is shape_hull
module ISOEnterShapeHull(thickness_difference, depth_difference, modifier){
    unit = 18.16; // TODO probably not
		height = 8 - depth_difference;
		length = 1.5 * unit; // TODO not used. need for dish

    translate([-0.125 * unit, unit*.5]) linear_extrude(height=height*modifier, scale=[.8, .9]){
        translate([-unit*.5, -unit*1.5]) minkowski(){
            fakeISOEnter(thickness_difference);
        }
    }
}
